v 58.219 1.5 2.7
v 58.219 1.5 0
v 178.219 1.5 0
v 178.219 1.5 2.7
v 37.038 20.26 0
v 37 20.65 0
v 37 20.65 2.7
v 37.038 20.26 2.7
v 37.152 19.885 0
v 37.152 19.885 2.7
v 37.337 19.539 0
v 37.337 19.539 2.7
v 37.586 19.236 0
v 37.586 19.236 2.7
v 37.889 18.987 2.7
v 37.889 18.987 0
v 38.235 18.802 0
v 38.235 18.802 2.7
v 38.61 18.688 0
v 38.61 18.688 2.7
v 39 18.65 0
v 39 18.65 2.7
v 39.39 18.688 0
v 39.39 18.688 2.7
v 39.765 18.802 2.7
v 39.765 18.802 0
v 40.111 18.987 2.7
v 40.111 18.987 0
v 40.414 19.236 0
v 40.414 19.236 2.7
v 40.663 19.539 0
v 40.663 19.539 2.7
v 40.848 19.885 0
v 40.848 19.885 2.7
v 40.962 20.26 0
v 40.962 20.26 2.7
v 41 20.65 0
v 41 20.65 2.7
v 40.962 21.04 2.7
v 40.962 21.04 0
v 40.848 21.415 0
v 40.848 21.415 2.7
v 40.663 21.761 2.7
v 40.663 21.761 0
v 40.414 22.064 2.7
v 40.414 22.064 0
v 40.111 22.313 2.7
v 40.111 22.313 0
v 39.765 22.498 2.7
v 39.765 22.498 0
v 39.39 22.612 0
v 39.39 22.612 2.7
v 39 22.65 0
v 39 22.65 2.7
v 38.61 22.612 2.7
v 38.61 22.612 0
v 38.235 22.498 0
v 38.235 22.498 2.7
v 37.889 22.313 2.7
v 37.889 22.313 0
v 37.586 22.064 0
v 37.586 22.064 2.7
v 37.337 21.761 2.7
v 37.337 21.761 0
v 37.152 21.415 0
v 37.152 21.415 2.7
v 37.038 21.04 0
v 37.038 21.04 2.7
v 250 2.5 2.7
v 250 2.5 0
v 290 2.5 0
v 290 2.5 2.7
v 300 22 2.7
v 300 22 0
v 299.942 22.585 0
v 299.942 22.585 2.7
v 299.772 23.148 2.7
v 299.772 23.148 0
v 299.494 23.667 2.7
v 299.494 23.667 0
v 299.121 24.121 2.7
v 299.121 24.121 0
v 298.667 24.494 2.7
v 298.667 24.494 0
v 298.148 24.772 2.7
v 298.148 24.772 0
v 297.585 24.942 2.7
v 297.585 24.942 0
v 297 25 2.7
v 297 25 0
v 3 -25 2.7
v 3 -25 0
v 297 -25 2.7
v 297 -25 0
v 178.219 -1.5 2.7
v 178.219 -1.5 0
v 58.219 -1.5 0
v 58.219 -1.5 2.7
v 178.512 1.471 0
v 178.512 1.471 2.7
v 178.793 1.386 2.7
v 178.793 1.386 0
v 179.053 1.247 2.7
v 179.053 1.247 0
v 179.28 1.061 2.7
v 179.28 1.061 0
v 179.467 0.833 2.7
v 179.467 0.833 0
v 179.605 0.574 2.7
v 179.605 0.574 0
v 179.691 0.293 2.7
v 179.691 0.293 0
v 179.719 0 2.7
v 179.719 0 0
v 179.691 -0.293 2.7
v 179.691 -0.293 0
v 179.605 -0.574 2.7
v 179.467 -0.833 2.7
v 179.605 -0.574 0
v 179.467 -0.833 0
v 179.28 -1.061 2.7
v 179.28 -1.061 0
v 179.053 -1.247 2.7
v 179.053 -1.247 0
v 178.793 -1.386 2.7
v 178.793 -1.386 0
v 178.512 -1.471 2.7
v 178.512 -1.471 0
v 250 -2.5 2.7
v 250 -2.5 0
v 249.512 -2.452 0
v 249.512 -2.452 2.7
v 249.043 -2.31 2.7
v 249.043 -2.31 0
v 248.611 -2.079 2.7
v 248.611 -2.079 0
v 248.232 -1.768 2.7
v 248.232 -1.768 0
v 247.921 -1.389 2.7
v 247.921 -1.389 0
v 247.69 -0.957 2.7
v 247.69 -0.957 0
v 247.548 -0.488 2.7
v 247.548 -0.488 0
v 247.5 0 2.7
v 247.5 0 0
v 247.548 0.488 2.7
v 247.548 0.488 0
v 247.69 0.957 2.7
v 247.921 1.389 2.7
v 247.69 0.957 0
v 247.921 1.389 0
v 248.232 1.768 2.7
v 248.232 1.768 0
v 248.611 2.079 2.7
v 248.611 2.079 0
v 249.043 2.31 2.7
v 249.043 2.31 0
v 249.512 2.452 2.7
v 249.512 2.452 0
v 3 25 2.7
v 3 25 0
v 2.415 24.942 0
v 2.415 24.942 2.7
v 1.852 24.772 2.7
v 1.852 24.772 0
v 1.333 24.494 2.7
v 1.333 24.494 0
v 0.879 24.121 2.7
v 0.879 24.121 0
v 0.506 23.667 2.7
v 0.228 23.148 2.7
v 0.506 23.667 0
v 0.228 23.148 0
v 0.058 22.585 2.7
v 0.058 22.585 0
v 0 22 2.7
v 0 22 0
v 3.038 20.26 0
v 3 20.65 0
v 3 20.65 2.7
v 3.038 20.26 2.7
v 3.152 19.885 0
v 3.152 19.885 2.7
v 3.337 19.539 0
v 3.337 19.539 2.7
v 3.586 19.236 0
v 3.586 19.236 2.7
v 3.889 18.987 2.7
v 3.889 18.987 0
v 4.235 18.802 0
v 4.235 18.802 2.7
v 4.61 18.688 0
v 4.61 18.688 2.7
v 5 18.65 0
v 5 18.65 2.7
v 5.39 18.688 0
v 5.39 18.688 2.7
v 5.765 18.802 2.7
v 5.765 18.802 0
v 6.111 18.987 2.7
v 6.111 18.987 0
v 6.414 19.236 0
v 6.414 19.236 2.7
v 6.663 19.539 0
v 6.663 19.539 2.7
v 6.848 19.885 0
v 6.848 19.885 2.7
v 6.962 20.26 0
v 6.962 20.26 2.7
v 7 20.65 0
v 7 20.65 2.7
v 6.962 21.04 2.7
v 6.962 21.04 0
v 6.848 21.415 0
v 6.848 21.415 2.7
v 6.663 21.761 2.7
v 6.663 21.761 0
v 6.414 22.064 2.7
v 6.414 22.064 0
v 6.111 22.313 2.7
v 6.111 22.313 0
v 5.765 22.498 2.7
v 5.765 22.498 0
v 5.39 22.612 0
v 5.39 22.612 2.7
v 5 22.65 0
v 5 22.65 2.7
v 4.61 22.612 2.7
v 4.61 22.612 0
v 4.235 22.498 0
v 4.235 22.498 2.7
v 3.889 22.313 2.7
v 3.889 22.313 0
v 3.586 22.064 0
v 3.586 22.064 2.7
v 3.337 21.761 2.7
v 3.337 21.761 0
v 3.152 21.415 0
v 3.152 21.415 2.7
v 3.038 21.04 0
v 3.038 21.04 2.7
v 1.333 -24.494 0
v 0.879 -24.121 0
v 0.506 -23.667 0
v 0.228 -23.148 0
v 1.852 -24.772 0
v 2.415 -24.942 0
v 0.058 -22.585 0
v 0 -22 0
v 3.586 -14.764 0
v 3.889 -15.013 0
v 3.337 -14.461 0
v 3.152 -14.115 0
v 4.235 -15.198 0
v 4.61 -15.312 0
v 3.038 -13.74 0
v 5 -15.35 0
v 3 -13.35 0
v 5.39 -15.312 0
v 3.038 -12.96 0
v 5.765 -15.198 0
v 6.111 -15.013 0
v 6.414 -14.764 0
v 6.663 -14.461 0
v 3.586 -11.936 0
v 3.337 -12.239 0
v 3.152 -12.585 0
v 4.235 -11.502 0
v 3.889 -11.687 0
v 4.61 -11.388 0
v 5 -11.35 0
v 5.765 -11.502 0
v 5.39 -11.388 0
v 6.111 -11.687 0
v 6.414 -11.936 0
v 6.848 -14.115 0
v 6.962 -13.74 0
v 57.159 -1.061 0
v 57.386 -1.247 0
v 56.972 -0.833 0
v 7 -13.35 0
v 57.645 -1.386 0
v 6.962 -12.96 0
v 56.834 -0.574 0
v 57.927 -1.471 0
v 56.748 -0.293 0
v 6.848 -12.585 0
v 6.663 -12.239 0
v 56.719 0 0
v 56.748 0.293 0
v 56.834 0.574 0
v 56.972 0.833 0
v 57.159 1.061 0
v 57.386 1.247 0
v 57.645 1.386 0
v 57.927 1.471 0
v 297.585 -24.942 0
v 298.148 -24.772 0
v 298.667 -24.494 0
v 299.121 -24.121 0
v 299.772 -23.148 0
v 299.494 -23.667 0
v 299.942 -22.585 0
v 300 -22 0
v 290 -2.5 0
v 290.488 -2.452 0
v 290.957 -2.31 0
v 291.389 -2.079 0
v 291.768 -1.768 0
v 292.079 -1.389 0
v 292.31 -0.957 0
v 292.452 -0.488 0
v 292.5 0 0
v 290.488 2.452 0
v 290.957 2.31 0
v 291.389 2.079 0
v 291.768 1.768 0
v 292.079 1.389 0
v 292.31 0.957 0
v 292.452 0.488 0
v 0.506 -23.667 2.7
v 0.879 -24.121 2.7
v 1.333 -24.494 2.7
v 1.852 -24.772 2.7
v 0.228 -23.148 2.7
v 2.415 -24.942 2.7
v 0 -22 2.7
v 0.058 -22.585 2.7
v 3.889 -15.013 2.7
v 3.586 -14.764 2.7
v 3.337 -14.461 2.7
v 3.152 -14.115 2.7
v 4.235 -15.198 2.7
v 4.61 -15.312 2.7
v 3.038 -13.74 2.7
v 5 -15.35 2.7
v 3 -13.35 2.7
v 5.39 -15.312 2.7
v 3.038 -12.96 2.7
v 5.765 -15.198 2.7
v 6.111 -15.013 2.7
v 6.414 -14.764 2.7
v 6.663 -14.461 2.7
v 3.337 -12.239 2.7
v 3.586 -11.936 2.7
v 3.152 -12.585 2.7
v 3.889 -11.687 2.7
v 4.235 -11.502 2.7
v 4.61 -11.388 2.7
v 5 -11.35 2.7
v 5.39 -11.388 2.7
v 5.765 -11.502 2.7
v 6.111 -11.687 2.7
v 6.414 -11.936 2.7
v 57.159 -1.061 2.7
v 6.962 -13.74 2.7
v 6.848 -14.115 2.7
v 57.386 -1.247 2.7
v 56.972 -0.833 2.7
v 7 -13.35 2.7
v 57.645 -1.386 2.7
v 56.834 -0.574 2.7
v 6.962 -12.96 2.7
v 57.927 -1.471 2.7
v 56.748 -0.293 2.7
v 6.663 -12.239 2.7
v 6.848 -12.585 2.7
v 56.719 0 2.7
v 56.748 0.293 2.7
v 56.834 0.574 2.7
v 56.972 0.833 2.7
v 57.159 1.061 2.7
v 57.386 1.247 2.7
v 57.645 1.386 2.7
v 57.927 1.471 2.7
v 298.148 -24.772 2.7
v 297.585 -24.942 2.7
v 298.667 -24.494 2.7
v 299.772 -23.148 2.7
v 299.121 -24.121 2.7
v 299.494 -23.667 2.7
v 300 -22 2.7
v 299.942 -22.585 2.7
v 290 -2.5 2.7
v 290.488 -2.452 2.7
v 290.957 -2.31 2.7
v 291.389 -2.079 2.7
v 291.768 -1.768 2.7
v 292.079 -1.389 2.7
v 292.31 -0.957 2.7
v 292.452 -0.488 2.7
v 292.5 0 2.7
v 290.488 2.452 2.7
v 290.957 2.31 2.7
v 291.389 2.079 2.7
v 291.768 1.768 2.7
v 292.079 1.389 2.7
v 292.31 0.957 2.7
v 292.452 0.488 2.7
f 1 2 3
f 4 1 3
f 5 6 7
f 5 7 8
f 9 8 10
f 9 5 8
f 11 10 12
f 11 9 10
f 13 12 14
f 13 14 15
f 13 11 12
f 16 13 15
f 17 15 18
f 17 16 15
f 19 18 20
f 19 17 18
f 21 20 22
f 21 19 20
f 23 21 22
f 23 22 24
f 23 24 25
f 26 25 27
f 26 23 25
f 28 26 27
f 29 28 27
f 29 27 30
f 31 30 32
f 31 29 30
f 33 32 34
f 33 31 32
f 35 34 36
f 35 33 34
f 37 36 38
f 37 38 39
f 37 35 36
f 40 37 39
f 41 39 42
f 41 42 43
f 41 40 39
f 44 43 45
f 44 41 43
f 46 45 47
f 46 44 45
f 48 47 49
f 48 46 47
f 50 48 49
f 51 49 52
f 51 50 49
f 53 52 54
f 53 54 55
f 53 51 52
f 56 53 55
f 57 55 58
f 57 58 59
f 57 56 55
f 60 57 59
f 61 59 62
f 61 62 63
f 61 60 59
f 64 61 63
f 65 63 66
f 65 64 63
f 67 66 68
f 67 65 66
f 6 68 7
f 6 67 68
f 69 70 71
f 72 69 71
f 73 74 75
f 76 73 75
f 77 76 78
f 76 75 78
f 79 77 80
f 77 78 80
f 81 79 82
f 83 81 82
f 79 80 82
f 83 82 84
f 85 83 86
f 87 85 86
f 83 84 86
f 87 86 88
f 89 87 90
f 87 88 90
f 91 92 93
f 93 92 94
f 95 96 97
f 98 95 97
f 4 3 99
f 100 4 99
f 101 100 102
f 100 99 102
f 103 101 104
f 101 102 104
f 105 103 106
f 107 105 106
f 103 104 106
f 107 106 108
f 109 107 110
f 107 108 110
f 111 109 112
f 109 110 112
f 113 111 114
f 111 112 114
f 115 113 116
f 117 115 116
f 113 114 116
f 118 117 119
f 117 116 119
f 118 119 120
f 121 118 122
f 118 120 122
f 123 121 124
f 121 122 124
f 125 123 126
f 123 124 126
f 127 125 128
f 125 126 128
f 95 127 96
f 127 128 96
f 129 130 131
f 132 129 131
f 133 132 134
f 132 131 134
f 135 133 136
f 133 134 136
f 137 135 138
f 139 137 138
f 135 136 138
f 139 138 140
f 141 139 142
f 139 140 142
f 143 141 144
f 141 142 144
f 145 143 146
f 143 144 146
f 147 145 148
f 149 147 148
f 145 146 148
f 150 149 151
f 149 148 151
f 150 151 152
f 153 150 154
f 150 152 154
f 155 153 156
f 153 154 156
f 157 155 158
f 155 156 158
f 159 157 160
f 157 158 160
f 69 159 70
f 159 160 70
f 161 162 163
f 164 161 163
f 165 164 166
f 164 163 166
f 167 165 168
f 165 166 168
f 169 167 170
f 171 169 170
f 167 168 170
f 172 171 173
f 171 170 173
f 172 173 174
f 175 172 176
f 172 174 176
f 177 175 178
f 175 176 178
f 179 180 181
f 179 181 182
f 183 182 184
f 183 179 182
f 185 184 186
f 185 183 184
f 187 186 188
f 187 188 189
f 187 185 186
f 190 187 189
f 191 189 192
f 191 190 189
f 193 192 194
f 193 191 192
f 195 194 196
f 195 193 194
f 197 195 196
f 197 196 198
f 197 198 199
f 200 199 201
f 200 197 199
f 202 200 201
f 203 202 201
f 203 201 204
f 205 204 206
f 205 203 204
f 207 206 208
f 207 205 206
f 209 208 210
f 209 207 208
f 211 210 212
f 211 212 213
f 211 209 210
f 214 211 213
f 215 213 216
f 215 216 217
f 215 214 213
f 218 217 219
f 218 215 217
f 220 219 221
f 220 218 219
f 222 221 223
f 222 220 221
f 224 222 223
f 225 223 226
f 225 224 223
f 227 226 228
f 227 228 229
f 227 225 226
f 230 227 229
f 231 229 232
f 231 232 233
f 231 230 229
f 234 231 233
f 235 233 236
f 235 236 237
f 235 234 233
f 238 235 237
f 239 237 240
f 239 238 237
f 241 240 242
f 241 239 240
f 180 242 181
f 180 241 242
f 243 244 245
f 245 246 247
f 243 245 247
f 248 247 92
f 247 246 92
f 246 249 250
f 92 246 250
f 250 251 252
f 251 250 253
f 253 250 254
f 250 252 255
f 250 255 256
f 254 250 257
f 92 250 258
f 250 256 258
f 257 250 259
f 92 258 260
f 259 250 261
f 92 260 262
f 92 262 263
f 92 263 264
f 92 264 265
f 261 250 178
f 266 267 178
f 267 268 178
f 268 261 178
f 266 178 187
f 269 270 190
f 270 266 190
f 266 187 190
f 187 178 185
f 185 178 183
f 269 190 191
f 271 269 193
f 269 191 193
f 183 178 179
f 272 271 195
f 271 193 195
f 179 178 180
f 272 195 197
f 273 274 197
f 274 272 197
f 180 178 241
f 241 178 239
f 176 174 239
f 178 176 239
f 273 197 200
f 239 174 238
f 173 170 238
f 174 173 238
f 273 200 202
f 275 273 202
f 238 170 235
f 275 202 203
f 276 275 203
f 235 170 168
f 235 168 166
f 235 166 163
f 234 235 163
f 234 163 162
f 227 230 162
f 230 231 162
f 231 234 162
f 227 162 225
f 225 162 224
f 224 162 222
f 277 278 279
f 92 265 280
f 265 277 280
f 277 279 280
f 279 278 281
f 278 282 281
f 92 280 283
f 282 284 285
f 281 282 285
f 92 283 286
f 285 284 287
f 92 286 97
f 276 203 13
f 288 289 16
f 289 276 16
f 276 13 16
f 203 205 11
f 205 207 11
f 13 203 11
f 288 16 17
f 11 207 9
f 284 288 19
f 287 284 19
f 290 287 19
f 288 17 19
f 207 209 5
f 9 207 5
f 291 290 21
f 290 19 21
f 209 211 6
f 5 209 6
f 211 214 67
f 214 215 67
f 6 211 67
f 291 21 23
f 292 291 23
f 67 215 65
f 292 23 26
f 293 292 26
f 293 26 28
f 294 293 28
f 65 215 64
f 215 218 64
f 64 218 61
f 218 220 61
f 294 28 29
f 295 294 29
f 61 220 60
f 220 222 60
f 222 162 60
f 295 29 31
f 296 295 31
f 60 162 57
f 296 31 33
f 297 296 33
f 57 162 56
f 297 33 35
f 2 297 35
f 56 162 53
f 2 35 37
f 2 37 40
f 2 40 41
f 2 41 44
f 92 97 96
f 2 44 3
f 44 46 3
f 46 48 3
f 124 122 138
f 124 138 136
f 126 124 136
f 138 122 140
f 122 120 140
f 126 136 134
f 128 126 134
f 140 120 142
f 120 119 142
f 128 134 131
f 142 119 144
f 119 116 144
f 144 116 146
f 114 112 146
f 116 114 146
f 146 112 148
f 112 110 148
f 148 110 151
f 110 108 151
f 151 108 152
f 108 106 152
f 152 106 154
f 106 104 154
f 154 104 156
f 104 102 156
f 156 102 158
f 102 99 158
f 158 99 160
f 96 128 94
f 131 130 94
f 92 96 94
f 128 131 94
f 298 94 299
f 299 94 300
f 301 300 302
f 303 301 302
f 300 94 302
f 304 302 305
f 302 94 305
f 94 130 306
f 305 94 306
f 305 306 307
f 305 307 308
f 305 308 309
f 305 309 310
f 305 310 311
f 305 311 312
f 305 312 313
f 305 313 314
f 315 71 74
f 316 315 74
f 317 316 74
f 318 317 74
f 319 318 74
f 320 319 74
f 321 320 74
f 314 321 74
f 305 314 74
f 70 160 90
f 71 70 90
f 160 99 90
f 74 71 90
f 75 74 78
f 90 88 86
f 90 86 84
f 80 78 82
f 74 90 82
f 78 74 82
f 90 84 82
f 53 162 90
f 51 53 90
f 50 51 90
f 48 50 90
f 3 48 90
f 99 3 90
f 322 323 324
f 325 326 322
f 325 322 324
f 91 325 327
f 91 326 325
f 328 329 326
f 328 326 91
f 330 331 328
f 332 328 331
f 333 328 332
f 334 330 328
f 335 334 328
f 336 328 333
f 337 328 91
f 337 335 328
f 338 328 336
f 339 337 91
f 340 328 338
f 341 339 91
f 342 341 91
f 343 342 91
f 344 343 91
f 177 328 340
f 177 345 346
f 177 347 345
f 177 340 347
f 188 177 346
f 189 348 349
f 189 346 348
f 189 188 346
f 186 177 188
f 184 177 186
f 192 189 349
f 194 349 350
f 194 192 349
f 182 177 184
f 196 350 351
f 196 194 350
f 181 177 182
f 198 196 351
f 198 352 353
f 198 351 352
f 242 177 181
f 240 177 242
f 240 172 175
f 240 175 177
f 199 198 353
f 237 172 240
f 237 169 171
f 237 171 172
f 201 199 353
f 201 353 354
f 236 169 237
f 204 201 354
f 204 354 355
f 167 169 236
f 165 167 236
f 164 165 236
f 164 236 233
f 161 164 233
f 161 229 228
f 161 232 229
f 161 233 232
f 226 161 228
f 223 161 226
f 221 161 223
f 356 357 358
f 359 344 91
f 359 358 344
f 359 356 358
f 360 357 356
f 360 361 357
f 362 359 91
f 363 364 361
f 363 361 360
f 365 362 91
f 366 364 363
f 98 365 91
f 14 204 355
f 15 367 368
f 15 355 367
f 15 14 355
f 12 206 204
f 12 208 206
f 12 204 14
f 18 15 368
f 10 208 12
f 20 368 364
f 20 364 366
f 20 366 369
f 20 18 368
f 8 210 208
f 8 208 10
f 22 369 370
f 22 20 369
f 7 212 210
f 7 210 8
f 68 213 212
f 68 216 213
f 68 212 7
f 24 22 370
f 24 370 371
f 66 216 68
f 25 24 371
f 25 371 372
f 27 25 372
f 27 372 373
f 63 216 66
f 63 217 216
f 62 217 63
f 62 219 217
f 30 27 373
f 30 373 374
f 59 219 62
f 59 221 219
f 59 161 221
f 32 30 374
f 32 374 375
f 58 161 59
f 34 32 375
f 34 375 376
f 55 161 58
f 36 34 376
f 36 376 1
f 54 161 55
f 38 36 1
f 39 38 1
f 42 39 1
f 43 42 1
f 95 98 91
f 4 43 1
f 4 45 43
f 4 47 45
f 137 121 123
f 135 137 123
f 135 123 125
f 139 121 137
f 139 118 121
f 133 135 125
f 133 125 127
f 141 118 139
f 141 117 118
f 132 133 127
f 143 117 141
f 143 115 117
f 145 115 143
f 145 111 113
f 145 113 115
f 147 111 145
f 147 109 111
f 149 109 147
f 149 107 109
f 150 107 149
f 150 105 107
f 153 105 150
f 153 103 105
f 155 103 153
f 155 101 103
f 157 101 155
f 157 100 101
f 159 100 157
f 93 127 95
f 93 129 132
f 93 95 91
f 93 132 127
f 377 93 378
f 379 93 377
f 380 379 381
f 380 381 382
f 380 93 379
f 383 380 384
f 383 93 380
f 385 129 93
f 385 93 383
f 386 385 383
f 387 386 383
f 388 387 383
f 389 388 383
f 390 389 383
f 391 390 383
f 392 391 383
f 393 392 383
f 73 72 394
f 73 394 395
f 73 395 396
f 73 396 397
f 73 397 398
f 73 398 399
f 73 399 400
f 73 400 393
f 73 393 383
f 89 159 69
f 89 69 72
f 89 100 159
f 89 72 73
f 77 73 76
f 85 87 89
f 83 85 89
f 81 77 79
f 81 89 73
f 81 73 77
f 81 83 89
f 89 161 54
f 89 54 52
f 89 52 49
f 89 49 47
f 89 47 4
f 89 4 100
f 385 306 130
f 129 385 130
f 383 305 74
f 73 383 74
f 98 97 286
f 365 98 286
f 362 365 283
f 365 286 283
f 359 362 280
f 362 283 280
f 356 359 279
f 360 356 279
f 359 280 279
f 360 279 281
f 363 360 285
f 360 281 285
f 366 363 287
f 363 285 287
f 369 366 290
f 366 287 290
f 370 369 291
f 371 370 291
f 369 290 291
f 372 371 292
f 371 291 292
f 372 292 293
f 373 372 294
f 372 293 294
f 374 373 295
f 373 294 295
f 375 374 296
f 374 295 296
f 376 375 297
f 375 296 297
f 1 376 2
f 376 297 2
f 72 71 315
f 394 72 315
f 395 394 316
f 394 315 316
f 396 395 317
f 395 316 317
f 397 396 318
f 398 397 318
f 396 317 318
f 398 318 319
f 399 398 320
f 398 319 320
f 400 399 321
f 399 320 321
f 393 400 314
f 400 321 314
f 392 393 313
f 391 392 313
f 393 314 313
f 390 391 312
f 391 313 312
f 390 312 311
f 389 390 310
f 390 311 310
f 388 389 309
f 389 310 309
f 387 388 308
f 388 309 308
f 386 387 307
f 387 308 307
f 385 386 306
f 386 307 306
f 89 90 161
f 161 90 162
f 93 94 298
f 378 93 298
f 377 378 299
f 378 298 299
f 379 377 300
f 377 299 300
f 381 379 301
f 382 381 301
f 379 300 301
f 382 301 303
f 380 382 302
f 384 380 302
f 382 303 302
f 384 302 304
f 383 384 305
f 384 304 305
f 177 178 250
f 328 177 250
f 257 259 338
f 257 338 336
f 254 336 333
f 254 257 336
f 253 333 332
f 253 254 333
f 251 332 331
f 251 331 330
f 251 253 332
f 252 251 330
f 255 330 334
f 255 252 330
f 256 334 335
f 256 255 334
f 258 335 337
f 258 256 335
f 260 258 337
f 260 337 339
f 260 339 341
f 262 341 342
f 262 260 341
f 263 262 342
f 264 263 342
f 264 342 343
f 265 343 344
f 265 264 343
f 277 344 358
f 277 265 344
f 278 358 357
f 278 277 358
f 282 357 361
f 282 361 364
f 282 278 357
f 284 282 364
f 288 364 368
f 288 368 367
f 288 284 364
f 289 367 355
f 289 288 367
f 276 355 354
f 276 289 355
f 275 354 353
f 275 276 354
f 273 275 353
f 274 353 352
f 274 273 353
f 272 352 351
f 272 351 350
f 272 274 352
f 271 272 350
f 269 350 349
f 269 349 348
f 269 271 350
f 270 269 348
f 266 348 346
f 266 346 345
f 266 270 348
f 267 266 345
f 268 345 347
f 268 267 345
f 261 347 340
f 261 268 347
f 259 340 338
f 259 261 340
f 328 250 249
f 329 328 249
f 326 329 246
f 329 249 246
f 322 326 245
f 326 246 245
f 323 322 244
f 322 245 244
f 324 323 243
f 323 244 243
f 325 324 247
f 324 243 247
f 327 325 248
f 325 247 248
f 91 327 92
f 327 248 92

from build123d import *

# Parameters (mm, degrees)
SKETCH_1_R      = 2
EXTRUDE_1_DEPTH = 2.7


with BuildPart() as part:
    # 草图1 → 凸台-拉伸1 (new body)
    with BuildSketch(Plane.XY):
        with BuildLine():
            Line((0, 22), (0, -22))
            ThreePointArc((0, -22), (0.878679656, -24.121320344), (3, -25))
            Line((3, -25), (297, -25))
            ThreePointArc((297, -25), (299.121320344, -24.121320344), (300, -22))
            Line((300, -22), (300, 22))
            ThreePointArc((300, 22), (299.121320344, 24.121320344), (297, 25))
            Line((297, 25), (3, 25))
            ThreePointArc((3, 25), (0.878679656, 24.121320344), (0, 22))
        make_face()
        with Locations(Location((5, 20.65, 0), (0, 0, 180))):
            Circle(SKETCH_1_R, mode=Mode.SUBTRACT)
        with Locations(Location((39, 20.65, 0), (0, 0, 180))):
            Circle(SKETCH_1_R, mode=Mode.SUBTRACT)
        with Locations(Location((5, -13.35, 0), (0, 0, 180))):
            Circle(SKETCH_1_R, mode=Mode.SUBTRACT)
        with BuildLine():
            Line((250, 2.5), (290, 2.5))
            ThreePointArc((290, 2.5), (292.5, 0), (290, -2.5))
            Line((290, -2.5), (250, -2.5))
            ThreePointArc((250, -2.5), (247.5, 0), (250, 2.5))
        make_face(mode=Mode.SUBTRACT)
        with BuildLine():
            Line((58.219392868, 1.5), (178.219392868, 1.5))
            ThreePointArc((178.219392868, 1.5), (179.719392868, 0), (178.219392868, -1.5))
            Line((178.219392868, -1.5), (58.219392868, -1.5))
            ThreePointArc((58.219392868, -1.5), (56.719392868, 0), (58.219392868, 1.5))
        make_face(mode=Mode.SUBTRACT)
    extrude(amount=EXTRUDE_1_DEPTH)


solid = part.part
